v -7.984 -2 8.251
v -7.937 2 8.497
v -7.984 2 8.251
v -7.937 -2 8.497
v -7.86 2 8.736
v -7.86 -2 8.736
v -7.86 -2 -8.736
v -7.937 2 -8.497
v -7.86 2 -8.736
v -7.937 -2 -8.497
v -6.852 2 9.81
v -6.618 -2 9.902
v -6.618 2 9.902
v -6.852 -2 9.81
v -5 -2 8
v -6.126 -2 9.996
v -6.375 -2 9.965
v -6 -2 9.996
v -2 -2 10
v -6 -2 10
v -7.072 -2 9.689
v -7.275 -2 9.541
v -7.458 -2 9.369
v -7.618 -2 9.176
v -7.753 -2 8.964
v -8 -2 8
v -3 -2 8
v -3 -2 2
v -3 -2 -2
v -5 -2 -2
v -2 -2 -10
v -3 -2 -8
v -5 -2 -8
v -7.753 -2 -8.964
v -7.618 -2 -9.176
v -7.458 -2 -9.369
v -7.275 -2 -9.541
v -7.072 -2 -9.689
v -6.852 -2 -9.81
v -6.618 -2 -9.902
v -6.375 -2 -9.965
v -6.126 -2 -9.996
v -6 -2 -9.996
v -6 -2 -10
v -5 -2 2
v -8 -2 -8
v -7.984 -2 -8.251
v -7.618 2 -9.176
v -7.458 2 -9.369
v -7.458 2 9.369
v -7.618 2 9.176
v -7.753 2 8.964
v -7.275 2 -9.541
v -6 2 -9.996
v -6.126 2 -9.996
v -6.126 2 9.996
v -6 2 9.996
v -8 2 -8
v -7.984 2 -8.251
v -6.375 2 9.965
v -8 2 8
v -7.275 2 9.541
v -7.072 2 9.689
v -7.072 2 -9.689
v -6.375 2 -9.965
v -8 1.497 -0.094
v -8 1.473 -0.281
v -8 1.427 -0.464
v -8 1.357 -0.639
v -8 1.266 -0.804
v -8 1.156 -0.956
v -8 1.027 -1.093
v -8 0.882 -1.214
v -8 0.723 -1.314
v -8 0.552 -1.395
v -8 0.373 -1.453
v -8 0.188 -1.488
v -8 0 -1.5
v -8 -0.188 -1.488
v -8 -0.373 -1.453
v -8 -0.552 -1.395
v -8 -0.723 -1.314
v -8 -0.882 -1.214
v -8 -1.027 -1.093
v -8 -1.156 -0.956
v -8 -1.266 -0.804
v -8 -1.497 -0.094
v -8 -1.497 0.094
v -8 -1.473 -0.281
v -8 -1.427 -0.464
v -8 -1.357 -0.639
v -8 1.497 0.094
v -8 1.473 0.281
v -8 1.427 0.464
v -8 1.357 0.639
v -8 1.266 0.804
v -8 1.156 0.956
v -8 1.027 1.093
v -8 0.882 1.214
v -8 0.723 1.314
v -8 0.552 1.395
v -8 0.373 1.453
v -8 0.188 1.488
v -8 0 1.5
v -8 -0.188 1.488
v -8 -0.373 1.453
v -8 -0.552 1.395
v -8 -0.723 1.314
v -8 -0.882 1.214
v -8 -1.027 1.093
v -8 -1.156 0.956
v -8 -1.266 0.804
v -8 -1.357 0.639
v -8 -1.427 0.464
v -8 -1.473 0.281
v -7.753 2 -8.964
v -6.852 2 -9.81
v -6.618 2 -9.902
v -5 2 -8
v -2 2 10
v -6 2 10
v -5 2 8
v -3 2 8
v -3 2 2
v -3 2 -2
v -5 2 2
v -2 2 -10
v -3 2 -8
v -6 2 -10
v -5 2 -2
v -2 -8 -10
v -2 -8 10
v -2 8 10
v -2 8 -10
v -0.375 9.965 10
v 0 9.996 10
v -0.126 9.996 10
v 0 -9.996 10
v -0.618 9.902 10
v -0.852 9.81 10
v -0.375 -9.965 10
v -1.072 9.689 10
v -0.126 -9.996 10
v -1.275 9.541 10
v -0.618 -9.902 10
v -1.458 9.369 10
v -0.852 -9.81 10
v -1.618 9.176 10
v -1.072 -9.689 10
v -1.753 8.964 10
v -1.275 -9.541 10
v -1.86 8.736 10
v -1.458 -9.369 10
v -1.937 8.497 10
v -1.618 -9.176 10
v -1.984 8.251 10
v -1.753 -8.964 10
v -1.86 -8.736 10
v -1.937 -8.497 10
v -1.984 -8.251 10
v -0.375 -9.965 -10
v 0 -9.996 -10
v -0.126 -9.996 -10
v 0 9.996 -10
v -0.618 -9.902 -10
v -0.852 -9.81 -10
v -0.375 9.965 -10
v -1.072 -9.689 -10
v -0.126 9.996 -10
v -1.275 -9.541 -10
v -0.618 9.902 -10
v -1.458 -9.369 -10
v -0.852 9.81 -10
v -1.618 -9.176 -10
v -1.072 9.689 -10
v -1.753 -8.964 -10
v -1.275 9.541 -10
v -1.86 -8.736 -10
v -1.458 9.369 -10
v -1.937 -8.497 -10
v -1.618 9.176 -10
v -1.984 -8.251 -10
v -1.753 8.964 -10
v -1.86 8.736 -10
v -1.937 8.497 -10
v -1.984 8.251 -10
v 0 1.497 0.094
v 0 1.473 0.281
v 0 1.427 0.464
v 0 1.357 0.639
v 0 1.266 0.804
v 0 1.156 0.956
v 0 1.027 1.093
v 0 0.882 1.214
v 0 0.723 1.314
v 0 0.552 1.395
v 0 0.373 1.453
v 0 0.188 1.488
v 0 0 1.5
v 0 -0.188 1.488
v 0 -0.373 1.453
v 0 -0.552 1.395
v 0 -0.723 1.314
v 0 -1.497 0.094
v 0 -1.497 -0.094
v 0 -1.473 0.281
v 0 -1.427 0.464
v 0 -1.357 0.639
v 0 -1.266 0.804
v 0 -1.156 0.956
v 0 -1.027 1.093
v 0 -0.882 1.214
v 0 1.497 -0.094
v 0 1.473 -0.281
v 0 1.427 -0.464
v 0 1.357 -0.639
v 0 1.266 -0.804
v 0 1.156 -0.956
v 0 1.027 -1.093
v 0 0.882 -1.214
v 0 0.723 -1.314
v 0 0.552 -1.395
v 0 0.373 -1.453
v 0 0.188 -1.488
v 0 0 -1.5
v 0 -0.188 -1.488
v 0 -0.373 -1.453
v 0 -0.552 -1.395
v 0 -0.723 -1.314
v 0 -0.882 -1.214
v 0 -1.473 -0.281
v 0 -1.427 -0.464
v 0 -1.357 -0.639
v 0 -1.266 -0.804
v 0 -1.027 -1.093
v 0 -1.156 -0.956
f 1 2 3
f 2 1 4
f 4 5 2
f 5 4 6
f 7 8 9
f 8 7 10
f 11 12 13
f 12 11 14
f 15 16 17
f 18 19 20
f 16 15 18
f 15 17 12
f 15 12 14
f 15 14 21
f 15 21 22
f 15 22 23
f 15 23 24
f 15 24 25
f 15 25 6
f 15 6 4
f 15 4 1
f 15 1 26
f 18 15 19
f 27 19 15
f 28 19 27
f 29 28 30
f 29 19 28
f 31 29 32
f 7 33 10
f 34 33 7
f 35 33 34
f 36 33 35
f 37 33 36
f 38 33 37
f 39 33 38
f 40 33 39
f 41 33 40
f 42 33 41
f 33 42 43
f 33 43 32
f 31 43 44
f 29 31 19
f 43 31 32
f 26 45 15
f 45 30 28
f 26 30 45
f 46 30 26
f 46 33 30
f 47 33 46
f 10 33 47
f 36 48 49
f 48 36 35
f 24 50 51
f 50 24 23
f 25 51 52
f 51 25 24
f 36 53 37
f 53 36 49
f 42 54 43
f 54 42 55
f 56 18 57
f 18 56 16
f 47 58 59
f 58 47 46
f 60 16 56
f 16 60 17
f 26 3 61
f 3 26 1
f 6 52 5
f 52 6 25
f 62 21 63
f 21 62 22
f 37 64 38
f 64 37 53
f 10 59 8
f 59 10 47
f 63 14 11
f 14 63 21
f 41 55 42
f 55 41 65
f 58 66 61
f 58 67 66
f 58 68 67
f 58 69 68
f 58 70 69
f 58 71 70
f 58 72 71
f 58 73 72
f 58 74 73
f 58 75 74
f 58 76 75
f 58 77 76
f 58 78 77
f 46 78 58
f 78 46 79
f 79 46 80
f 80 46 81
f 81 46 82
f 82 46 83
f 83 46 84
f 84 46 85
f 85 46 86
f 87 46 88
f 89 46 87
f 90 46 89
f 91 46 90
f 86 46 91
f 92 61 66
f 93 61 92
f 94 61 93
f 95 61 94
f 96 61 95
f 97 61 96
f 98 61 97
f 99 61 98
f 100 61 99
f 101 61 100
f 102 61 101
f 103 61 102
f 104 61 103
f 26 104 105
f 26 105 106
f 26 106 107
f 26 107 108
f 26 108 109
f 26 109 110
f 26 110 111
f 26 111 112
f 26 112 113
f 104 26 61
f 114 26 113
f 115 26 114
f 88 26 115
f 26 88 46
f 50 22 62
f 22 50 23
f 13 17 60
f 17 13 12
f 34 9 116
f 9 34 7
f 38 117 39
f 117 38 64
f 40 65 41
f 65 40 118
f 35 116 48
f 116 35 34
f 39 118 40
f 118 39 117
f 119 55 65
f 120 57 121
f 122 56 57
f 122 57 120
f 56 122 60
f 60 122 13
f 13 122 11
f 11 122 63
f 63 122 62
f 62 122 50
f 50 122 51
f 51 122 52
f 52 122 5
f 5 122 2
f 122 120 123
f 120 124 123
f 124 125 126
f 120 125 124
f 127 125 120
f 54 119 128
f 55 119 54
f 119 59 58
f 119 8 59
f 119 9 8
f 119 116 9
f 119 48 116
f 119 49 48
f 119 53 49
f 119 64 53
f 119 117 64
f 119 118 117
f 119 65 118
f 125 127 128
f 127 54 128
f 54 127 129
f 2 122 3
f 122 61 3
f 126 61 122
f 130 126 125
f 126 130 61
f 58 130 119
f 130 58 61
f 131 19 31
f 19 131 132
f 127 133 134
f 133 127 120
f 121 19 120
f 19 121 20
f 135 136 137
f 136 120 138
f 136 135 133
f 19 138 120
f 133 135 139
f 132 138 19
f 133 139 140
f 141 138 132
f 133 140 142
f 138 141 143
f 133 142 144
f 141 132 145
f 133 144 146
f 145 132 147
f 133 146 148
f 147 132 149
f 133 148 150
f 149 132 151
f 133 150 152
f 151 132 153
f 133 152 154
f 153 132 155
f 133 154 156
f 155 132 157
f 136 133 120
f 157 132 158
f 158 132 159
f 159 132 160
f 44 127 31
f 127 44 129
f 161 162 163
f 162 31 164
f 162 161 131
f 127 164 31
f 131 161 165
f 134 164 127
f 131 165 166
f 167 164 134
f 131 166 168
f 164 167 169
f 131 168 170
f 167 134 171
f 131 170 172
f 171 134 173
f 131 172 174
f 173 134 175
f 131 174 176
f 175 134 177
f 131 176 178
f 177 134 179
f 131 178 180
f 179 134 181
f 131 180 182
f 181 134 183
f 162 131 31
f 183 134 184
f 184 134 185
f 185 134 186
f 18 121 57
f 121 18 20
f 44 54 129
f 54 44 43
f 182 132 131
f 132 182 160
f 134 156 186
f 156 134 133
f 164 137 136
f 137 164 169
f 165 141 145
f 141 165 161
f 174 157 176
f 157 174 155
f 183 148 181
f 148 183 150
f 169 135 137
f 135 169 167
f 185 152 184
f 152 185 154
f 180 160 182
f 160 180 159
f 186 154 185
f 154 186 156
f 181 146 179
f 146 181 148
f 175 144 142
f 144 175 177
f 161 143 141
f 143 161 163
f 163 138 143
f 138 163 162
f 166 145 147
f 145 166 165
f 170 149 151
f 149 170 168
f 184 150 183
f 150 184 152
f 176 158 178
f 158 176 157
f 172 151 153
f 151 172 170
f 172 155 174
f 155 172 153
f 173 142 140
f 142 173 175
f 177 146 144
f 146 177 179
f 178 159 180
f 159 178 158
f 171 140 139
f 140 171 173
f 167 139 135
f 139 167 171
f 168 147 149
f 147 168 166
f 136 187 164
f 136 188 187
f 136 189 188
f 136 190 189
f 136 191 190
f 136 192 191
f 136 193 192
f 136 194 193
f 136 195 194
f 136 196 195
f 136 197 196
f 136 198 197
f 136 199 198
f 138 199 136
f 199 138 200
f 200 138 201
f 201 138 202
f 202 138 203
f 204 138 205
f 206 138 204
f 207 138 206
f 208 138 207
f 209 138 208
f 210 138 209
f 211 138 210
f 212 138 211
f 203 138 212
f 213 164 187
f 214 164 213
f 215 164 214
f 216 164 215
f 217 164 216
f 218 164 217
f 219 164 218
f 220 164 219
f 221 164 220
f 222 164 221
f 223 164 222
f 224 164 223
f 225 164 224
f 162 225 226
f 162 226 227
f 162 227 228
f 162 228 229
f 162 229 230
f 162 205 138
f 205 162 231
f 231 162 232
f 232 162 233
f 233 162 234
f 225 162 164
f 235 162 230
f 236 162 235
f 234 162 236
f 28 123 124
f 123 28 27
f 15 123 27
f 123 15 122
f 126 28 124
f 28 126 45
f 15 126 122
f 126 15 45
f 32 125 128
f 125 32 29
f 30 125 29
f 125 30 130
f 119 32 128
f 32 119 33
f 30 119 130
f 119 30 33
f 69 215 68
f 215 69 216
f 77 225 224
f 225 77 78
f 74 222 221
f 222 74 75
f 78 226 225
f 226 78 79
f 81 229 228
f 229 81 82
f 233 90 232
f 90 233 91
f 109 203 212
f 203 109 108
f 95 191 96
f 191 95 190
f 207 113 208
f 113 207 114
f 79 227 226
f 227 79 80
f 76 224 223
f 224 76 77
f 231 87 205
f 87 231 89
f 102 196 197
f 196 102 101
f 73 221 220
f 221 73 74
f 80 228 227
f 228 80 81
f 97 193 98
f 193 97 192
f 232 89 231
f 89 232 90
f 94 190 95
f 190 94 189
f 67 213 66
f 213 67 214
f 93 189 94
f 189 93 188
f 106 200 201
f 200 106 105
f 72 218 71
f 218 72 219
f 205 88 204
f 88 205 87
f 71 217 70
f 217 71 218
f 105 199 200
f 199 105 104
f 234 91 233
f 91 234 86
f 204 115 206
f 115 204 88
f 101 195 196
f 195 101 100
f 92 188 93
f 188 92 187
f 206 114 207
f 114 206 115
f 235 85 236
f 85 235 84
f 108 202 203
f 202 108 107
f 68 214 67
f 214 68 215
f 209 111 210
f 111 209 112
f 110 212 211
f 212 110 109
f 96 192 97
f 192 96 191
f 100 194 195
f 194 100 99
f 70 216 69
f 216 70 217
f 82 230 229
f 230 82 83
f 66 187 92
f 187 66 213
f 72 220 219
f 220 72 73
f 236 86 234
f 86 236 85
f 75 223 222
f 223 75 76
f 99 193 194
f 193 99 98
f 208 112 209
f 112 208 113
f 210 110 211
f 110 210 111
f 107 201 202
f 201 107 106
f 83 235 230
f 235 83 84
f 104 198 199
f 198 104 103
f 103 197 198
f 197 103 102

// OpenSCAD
////////////////////////////////////////VARIABLES///////////////////////////////////
////////////////////////////////////////////////////////////////////////////////////

Plate_width = 20; //[10:30]
Tie_pos = 2; //[1:0.5:3]
Holder_height = 20; //[18:30]
Holder_blk = 4; //[3.5:0.5:6] 
Tie_thickness = 2; //[1:0.5:3] 
Tie_width = 6; // [3:0.5:6] 
Holder_type = "flat"; // [flat,curve] 
Center_hole = "yes"; // [yes,no]

/* [Hidden] */
holedia = 3 ; // center hole

//////////////////////////////////////////RENDER////////////////////////////////////
////////////////////////////////////////////////////////////////////////////////////

if (Holder_type == "curve")
{curvedholder();}
else if (Holder_type == "flat")
{flatholder();}

//////////////////////////////////////////MODULES///////////////////////////////////
////////////////////////////////////////////////////////////////////////////////////

module flatholder()
{
    difference()
    {
        union()
        {
        translate([-Holder_blk-(Holder_blk/2),0,0])straight();
        difference()
        {
            hull()
            {
                translate([0,-((Plate_width/2)-(Holder_blk/2)),0])cylinder(h=Holder_height,d=Holder_blk,center=true,$fn=50);
                translate([0,((Plate_width/2)-(Holder_blk/2)),0])cylinder(h=Holder_height,d=Holder_blk,center=true,$fn=50);
            }
            translate([Holder_blk/2,0,0])cube([Holder_blk,Plate_width+Holder_blk,Holder_height+1],center=true);
        }
        }
        translate([Plate_width/2,0,0]) holes();
    }
}

module curvedholder()
{
    difference()
    {
        union()
        {
            curve();
            translate ([-((Plate_width/2)+(Tie_pos/2)+(Holder_blk)),0,0]) straight();
        }
        holes();
    }
}

module holes()
{
translate([-((Plate_width/2)+Tie_pos+(Holder_blk/2)),0,Holder_height/4]) cube([Tie_thickness,Holder_blk*2,Tie_width],center=true);
translate([-((Plate_width/2)+Tie_pos+(Holder_blk/2)),0,-Holder_height/4]) cube([Tie_thickness,Holder_blk*2,Tie_width],center=true);
if (Center_hole == "yes") {translate([-((Plate_width/2)+(Tie_pos/2)+(Holder_blk/2)),0,0]) rotate([0,90,0]) cylinder(h=Holder_blk*3, d=holedia,center=true,$fn=50);}
}
module straight()
{
    hull()
    {
    translate([0,0,((Holder_height/2)-(Holder_blk/2))]) rotate([90,0,0]) cylinder(h=Holder_blk,d=Holder_blk,center=true,$fn=50);
    translate([0,0,-((Holder_height/2)-(Holder_blk/2))]) rotate([90,0,0]) cylinder(h=Holder_blk,d=Holder_blk,center=true,$fn=50);
    }

    translate([Holder_blk/2,0,0])cube([Holder_blk,Holder_blk,Holder_height],center=true);
}

module curve()
{
    difference()
    {
        union()
        {
            cylinder(h=Holder_height,d=Plate_width+(Tie_pos*2),center=true,$fn=150);
            
        }
        union()
        {
            cylinder(h=Holder_height+1,d=Plate_width,center=true,$fn=150);
            translate([15,0,0]) cube([30,40,26],center=true);
        }
    }
    
    translate([0,-(Plate_width/2+(Tie_pos/2)),0])cylinder(h=Holder_height,d=Tie_pos,center=true,$fn=50);
            translate([0,(Plate_width/2+(Tie_pos/2)),0])cylinder(h=Holder_height,d=Tie_pos,center=true,$fn=50);
    
}
